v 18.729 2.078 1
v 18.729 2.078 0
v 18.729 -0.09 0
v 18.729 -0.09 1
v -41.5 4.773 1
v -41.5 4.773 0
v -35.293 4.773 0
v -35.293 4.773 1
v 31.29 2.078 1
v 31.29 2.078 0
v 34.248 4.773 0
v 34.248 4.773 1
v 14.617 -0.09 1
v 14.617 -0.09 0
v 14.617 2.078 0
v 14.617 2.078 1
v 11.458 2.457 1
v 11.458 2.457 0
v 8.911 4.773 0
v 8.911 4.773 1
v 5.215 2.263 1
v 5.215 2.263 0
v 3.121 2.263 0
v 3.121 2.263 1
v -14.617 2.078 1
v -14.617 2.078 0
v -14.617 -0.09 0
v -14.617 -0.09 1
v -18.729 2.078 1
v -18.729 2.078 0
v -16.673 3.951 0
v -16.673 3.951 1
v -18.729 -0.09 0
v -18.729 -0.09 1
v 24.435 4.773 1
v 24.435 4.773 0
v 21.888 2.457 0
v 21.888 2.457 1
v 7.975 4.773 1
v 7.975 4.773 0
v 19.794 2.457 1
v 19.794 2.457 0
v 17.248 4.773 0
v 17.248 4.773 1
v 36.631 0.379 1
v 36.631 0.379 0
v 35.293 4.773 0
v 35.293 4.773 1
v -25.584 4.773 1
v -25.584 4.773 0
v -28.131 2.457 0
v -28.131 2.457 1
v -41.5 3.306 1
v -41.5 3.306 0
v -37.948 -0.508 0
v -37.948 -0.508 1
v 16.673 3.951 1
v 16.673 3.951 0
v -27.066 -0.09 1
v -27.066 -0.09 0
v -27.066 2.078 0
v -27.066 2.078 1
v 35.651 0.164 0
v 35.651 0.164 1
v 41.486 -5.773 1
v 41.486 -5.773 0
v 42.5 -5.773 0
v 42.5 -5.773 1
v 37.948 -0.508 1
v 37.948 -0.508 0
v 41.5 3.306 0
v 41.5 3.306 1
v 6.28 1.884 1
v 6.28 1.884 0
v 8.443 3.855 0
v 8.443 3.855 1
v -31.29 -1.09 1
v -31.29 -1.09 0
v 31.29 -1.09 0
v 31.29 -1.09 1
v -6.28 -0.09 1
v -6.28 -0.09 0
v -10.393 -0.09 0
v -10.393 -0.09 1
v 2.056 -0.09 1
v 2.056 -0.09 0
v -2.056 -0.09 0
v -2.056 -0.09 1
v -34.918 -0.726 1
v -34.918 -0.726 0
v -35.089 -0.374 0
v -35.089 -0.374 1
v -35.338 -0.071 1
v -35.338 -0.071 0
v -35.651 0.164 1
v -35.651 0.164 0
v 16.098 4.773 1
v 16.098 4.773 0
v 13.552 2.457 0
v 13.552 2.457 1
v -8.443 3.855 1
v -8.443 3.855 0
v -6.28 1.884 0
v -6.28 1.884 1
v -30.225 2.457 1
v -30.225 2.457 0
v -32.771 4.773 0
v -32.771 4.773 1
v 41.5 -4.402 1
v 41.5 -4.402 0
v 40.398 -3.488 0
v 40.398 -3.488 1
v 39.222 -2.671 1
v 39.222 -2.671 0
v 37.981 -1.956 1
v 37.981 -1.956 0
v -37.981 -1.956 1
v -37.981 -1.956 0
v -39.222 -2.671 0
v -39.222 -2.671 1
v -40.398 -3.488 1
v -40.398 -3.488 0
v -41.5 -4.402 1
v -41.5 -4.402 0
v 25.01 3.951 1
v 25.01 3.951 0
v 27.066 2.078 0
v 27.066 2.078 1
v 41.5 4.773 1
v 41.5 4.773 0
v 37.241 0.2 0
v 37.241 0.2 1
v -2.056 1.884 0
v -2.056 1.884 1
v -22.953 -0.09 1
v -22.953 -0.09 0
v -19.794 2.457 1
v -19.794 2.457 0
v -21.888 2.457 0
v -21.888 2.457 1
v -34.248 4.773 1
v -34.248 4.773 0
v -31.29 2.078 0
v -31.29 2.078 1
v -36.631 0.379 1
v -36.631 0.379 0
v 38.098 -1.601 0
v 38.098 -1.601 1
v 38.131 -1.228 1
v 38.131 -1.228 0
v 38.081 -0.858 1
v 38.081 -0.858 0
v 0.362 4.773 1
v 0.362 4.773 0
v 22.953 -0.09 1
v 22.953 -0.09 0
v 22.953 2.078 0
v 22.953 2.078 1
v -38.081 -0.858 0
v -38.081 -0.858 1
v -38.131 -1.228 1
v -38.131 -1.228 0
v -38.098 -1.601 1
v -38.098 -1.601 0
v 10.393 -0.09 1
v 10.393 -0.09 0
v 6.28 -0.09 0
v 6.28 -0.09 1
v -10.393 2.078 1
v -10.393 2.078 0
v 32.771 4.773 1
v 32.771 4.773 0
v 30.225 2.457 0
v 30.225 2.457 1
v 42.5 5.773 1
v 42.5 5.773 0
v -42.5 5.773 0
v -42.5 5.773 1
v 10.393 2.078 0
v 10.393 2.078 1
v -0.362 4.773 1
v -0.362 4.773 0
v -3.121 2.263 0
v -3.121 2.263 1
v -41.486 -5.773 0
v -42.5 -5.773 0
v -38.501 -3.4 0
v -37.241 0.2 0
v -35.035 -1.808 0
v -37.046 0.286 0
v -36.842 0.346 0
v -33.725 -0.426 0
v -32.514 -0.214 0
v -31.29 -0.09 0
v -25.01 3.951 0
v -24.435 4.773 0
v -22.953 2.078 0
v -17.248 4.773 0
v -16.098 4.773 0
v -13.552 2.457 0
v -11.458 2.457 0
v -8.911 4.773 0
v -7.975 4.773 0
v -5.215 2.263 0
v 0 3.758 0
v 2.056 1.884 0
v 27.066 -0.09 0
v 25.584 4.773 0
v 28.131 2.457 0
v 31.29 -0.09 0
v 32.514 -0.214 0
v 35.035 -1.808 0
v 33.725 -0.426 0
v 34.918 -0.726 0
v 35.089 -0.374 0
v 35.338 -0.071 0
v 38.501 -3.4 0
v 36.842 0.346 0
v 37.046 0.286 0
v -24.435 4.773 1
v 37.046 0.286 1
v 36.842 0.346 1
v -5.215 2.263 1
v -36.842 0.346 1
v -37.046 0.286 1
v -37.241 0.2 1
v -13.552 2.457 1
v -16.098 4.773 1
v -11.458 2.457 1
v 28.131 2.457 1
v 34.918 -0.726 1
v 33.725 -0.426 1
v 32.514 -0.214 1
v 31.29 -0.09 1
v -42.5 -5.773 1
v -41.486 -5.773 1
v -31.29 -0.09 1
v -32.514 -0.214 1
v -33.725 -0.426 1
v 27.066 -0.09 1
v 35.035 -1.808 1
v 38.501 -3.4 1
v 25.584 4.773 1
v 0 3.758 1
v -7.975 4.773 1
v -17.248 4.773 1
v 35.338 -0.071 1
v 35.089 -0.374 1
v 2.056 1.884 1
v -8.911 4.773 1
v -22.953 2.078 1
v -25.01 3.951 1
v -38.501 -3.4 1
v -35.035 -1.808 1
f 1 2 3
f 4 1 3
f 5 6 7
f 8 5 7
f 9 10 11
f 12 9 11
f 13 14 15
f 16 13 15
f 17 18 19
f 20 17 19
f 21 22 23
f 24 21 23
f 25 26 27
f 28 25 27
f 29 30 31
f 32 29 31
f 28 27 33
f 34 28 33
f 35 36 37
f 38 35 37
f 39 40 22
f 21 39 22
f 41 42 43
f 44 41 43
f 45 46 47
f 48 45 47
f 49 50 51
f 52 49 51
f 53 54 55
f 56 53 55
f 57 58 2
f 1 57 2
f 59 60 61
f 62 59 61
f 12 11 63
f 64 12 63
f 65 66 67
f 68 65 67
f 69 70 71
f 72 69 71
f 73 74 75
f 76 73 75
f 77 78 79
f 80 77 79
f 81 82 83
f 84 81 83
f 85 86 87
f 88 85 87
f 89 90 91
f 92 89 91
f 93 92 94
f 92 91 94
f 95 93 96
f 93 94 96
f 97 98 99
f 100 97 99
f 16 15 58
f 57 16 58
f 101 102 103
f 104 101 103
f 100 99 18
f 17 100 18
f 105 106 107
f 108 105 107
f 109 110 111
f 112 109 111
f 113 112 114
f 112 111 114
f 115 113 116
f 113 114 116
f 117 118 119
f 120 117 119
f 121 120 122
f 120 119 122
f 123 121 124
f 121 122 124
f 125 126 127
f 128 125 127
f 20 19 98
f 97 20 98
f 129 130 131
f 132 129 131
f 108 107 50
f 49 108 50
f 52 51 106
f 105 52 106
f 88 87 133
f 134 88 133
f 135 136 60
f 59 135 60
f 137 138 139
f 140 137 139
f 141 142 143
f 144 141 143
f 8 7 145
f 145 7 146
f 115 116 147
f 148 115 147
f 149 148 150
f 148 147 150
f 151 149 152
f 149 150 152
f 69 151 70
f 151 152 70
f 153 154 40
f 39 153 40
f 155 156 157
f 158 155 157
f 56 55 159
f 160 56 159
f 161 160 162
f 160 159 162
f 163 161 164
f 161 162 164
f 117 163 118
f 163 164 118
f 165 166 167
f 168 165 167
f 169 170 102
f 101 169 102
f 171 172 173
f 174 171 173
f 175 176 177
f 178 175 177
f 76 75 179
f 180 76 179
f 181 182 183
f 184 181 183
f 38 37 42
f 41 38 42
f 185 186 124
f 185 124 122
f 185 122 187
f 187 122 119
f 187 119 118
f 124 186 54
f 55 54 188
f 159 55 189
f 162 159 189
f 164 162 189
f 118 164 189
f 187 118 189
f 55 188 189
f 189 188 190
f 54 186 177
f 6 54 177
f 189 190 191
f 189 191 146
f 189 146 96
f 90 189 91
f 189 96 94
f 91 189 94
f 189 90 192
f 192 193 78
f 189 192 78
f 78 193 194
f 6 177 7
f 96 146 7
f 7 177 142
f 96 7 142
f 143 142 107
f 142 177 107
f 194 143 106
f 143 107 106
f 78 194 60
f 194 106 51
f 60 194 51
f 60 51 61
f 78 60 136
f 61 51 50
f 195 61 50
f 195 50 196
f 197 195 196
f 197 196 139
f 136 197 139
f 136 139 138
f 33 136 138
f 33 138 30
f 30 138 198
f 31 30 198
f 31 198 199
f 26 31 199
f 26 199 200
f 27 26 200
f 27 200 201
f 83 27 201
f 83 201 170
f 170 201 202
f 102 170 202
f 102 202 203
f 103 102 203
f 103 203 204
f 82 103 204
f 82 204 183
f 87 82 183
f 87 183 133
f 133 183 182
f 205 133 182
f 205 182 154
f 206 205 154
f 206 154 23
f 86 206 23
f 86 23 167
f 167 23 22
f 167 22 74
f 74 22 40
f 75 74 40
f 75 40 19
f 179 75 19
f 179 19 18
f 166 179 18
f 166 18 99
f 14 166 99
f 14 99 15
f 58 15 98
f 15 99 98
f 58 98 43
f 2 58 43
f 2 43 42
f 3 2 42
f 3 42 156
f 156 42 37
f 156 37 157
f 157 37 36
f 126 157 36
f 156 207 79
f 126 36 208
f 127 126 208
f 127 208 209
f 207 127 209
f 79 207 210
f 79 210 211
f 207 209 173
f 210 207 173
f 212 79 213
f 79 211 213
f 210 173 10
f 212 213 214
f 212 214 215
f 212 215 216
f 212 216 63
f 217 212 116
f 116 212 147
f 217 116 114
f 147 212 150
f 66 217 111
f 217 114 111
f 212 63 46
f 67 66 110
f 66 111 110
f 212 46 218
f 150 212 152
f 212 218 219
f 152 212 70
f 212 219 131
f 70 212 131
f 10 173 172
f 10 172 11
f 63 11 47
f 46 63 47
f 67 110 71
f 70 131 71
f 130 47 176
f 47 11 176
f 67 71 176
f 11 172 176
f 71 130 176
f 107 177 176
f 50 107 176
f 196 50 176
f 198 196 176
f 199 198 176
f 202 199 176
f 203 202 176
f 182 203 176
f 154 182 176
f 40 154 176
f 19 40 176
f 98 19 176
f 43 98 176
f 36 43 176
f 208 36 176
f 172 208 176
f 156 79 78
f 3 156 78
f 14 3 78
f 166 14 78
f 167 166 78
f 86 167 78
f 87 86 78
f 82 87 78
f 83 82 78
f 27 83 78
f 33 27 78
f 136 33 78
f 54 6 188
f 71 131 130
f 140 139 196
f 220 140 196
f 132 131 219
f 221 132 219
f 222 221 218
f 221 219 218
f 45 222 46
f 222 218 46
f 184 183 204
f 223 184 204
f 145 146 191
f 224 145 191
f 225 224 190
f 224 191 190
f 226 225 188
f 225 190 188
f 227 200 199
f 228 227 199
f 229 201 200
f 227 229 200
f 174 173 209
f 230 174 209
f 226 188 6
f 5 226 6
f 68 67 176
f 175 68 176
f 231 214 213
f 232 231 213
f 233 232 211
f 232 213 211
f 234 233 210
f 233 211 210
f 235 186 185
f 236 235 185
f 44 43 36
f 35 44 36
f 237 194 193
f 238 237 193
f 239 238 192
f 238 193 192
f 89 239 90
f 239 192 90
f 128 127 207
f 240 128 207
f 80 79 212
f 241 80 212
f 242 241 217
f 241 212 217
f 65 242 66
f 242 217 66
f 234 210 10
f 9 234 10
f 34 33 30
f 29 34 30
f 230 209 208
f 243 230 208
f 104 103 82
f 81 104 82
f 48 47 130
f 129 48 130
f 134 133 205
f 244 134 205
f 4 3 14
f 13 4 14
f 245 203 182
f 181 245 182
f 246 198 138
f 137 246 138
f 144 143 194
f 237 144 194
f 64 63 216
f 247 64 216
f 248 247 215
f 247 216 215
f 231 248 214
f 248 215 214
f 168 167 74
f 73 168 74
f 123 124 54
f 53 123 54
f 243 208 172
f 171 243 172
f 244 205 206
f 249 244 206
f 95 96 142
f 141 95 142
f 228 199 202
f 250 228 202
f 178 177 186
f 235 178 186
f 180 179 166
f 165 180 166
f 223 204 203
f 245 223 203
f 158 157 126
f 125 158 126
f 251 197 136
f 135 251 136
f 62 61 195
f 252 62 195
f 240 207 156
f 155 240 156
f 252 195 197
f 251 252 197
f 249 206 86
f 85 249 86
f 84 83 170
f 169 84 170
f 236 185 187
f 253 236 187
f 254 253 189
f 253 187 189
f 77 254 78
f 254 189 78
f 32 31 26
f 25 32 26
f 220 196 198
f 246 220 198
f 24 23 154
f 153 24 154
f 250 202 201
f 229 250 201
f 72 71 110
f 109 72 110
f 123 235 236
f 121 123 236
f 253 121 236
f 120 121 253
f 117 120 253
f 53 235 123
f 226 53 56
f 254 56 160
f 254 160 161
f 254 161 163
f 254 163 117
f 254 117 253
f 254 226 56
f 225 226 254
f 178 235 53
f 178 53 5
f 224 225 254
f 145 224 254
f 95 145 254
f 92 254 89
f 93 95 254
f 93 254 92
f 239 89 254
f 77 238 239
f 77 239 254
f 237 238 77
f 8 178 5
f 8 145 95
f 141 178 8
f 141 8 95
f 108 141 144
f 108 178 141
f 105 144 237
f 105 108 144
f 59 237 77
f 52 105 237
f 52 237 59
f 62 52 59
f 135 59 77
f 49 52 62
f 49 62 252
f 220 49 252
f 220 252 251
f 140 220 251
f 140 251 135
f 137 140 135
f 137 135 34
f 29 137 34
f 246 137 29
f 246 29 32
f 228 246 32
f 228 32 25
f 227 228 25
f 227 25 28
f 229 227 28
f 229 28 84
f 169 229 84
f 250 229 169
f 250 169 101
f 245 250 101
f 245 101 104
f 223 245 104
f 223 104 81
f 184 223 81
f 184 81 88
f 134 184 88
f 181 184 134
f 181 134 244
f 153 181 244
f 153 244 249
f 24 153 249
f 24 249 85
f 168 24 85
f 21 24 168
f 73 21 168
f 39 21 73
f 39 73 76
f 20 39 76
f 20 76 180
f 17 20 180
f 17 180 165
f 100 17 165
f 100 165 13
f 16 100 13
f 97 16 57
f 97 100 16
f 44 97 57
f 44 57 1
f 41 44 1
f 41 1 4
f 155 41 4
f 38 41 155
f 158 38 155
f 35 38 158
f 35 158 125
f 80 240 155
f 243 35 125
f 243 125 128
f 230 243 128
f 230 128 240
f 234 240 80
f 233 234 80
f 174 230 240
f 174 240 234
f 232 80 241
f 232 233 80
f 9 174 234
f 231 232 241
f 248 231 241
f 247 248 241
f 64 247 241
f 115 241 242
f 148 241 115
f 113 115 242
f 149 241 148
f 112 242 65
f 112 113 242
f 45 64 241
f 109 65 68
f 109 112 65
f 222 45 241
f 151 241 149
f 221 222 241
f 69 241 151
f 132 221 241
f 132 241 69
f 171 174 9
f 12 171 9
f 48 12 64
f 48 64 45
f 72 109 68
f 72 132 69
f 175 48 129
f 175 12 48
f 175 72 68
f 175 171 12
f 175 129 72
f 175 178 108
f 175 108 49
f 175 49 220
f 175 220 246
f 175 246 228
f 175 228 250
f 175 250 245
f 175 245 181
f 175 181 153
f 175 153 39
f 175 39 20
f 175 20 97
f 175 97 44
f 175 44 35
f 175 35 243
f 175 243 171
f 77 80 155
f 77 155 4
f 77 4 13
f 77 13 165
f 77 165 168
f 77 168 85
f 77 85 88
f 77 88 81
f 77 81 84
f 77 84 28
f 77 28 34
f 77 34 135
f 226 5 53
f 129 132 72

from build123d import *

# Parameters (mm, degrees)
F1_DEPTH = 1


# Not quite as in the source:
# - ends of sketch curves that miss each other by under 0.0002 mm in the source are joined


with BuildPart() as f1:
    # F0 (on Top) → F1 (new body)
    with BuildSketch(Plane.XY):
        with BuildLine():
            ThreePointArc((31.2898730428, -1.0903693776), (36.8162528215, -2.4992396802), (41.4861883055, -5.7729976987))
            Line((41.4861883055, -5.7729976987), (42.499983, -5.772998))
            Line((42.499983, -5.772998), (42.499983, 5.772998))
            Line((42.499983, 5.772998), (-42.499983, 5.772998))
            Line((-42.499983, 5.772998), (-42.499983, -5.772998))
            Line((-42.499983, -5.772998), (-41.486188, -5.772998))
            ThreePointArc((-41.486188, -5.772998), (-36.8162528215, -2.4992396802), (-31.2898730428, -1.0903693776))
            Line((-31.2898730428, -1.0903693776), (31.2898730428, -1.0903693776))
        make_face()
        with BuildLine():
            ThreePointArc((-37.980823226, -1.9562535657), (-39.8184929613, -3.0669655752), (-41.4999834083, -4.4023685483))
            Line((-41.4999834083, -4.4023685483), (-41.499983, 3.305772))
            Line((-41.499983, 3.305772), (-37.947737, -0.508143))
            ThreePointArc((-37.947737, -0.508143), (-38.1314028467, -1.2283801993), (-37.980823226, -1.9562535657))
        make_face(mode=Mode.SUBTRACT)
        with BuildLine():
            Line((41.499983, 3.305772), (41.499983, -4.402369))
            ThreePointArc((41.499983, -4.402369), (39.8184929613, -3.0669655752), (37.980823226, -1.9562535657))
            ThreePointArc((37.980823226, -1.9562535657), (38.1314028467, -1.2283801993), (37.9477363989, -0.5081433103))
            Line((37.9477363989, -0.5081433103), (41.499983, 3.305772))
        make_face(mode=Mode.SUBTRACT)
        with BuildLine():
            Line((-31.289873, 2.077969), (-31.289873, -0.09037))
            ThreePointArc((-31.289873, -0.09037), (-33.1211344425, -0.3089644519), (-34.9175362693, -0.7263880763))
            ThreePointArc((-34.9175362693, -0.7263880763), (-35.2042200678, -0.2151094555), (-35.6513559051, 0.1639211639))
            Line((-35.6513559051, 0.1639211639), (-34.24769, 4.772998))
            Line((-34.24769, 4.772998), (-31.289873, 2.077969))
        make_face(mode=Mode.SUBTRACT)
        with BuildLine():
            Line((-37.241042, 0.200331), (-41.499983, 4.772998))
            Line((-41.499983, 4.772998), (-35.293036, 4.772998))
            Line((-35.293036, 4.772998), (-36.631091, 0.379359))
            ThreePointArc((-36.631091, 0.379359), (-36.9447562748, 0.3194512642), (-37.241042, 0.200331))
        make_face(mode=Mode.SUBTRACT)
        Polygon((-22.953359, -0.09037), (-27.06573, -0.09037), (-27.06573, 2.077969), (-25.009544, 3.951473), (-22.953359, 2.077969), align=None, mode=Mode.SUBTRACT)
        Polygon((-14.616844, -0.09037), (-18.729215, -0.09037), (-18.729215, 2.077969), (-16.67303, 3.951473), (-14.616844, 2.077969), align=None, mode=Mode.SUBTRACT)
        Polygon((-6.280329, -0.09037), (-10.392701, -0.09037), (-10.392701, 2.077969), (-8.44277, 3.854658), (-6.280329, 1.884339), align=None, mode=Mode.SUBTRACT)
        Polygon((-25.584392, 4.772998), (-28.130887, 2.456623), (-30.224716, 2.456623), (-32.771212, 4.772998), align=None, mode=Mode.SUBTRACT)
        Polygon((-19.794373, 2.456623), (-21.888201, 2.456623), (-24.434697, 4.772998), (-17.247877, 4.772998), align=None, mode=Mode.SUBTRACT)
        Polygon((-11.457858, 2.456623), (-13.551687, 2.456623), (-16.098182, 4.772998), (-8.911362, 4.772998), align=None, mode=Mode.SUBTRACT)
        Polygon((-3.121343, 2.262993), (-5.215172, 2.262993), (-7.974534, 4.772998), (-0.361981, 4.772998), align=None, mode=Mode.SUBTRACT)
        Polygon((0, -0.09037), (-2.056186, -0.09037), (-2.056186, 1.884339), (0, 3.757843), (2.056186, 1.884339), (2.056186, -0.09037), align=None, mode=Mode.SUBTRACT)
        Polygon((10.392701, 2.077969), (10.392701, -0.09037), (6.280329, -0.09037), (6.280329, 1.884339), (8.44277, 3.854658), align=None, mode=Mode.SUBTRACT)
        Polygon((18.729215, 2.077969), (18.729215, -0.09037), (14.616844, -0.09037), (14.616844, 2.077969), (16.67303, 3.951473), align=None, mode=Mode.SUBTRACT)
        Polygon((27.06573, 2.077969), (27.06573, -0.09037), (22.953359, -0.09037), (22.953359, 2.077969), (25.009544, 3.951473), align=None, mode=Mode.SUBTRACT)
        with BuildLine():
            Line((31.289873, -0.09037), (31.289873, 2.077969))
            Line((31.289873, 2.077969), (34.24769, 4.772998))
            Line((34.24769, 4.772998), (35.651356, 0.163921))
            ThreePointArc((35.651356, 0.163921), (35.2042200678, -0.2151094555), (34.9175353631, -0.7263887799))
            ThreePointArc((34.9175353631, -0.7263887799), (33.1211344425, -0.3089644519), (31.289873, -0.09037))
        make_face(mode=Mode.SUBTRACT)
        with BuildLine():
            Line((35.293036, 4.772998), (41.499983, 4.772998))
            Line((41.499983, 4.772998), (37.241042, 0.200331))
            ThreePointArc((37.241042, 0.200331), (36.9447562748, 0.3194512642), (36.6310910035, 0.3793590379))
            Line((36.6310910035, 0.3793590379), (35.293036, 4.772998))
        make_face(mode=Mode.SUBTRACT)
        Polygon((7.974534, 4.772998), (5.215172, 2.262993), (3.121343, 2.262993), (0.361981, 4.772998), align=None, mode=Mode.SUBTRACT)
        Polygon((16.098182, 4.772998), (13.551687, 2.456623), (11.457858, 2.456623), (8.911362, 4.772998), align=None, mode=Mode.SUBTRACT)
        Polygon((24.434697, 4.772998), (21.888201, 2.456623), (19.794373, 2.456623), (17.247877, 4.772998), align=None, mode=Mode.SUBTRACT)
        Polygon((32.771212, 4.772998), (30.224716, 2.456623), (28.130887, 2.456623), (25.584392, 4.772998), align=None, mode=Mode.SUBTRACT)
    extrude(amount=F1_DEPTH)


solid = f1.part
